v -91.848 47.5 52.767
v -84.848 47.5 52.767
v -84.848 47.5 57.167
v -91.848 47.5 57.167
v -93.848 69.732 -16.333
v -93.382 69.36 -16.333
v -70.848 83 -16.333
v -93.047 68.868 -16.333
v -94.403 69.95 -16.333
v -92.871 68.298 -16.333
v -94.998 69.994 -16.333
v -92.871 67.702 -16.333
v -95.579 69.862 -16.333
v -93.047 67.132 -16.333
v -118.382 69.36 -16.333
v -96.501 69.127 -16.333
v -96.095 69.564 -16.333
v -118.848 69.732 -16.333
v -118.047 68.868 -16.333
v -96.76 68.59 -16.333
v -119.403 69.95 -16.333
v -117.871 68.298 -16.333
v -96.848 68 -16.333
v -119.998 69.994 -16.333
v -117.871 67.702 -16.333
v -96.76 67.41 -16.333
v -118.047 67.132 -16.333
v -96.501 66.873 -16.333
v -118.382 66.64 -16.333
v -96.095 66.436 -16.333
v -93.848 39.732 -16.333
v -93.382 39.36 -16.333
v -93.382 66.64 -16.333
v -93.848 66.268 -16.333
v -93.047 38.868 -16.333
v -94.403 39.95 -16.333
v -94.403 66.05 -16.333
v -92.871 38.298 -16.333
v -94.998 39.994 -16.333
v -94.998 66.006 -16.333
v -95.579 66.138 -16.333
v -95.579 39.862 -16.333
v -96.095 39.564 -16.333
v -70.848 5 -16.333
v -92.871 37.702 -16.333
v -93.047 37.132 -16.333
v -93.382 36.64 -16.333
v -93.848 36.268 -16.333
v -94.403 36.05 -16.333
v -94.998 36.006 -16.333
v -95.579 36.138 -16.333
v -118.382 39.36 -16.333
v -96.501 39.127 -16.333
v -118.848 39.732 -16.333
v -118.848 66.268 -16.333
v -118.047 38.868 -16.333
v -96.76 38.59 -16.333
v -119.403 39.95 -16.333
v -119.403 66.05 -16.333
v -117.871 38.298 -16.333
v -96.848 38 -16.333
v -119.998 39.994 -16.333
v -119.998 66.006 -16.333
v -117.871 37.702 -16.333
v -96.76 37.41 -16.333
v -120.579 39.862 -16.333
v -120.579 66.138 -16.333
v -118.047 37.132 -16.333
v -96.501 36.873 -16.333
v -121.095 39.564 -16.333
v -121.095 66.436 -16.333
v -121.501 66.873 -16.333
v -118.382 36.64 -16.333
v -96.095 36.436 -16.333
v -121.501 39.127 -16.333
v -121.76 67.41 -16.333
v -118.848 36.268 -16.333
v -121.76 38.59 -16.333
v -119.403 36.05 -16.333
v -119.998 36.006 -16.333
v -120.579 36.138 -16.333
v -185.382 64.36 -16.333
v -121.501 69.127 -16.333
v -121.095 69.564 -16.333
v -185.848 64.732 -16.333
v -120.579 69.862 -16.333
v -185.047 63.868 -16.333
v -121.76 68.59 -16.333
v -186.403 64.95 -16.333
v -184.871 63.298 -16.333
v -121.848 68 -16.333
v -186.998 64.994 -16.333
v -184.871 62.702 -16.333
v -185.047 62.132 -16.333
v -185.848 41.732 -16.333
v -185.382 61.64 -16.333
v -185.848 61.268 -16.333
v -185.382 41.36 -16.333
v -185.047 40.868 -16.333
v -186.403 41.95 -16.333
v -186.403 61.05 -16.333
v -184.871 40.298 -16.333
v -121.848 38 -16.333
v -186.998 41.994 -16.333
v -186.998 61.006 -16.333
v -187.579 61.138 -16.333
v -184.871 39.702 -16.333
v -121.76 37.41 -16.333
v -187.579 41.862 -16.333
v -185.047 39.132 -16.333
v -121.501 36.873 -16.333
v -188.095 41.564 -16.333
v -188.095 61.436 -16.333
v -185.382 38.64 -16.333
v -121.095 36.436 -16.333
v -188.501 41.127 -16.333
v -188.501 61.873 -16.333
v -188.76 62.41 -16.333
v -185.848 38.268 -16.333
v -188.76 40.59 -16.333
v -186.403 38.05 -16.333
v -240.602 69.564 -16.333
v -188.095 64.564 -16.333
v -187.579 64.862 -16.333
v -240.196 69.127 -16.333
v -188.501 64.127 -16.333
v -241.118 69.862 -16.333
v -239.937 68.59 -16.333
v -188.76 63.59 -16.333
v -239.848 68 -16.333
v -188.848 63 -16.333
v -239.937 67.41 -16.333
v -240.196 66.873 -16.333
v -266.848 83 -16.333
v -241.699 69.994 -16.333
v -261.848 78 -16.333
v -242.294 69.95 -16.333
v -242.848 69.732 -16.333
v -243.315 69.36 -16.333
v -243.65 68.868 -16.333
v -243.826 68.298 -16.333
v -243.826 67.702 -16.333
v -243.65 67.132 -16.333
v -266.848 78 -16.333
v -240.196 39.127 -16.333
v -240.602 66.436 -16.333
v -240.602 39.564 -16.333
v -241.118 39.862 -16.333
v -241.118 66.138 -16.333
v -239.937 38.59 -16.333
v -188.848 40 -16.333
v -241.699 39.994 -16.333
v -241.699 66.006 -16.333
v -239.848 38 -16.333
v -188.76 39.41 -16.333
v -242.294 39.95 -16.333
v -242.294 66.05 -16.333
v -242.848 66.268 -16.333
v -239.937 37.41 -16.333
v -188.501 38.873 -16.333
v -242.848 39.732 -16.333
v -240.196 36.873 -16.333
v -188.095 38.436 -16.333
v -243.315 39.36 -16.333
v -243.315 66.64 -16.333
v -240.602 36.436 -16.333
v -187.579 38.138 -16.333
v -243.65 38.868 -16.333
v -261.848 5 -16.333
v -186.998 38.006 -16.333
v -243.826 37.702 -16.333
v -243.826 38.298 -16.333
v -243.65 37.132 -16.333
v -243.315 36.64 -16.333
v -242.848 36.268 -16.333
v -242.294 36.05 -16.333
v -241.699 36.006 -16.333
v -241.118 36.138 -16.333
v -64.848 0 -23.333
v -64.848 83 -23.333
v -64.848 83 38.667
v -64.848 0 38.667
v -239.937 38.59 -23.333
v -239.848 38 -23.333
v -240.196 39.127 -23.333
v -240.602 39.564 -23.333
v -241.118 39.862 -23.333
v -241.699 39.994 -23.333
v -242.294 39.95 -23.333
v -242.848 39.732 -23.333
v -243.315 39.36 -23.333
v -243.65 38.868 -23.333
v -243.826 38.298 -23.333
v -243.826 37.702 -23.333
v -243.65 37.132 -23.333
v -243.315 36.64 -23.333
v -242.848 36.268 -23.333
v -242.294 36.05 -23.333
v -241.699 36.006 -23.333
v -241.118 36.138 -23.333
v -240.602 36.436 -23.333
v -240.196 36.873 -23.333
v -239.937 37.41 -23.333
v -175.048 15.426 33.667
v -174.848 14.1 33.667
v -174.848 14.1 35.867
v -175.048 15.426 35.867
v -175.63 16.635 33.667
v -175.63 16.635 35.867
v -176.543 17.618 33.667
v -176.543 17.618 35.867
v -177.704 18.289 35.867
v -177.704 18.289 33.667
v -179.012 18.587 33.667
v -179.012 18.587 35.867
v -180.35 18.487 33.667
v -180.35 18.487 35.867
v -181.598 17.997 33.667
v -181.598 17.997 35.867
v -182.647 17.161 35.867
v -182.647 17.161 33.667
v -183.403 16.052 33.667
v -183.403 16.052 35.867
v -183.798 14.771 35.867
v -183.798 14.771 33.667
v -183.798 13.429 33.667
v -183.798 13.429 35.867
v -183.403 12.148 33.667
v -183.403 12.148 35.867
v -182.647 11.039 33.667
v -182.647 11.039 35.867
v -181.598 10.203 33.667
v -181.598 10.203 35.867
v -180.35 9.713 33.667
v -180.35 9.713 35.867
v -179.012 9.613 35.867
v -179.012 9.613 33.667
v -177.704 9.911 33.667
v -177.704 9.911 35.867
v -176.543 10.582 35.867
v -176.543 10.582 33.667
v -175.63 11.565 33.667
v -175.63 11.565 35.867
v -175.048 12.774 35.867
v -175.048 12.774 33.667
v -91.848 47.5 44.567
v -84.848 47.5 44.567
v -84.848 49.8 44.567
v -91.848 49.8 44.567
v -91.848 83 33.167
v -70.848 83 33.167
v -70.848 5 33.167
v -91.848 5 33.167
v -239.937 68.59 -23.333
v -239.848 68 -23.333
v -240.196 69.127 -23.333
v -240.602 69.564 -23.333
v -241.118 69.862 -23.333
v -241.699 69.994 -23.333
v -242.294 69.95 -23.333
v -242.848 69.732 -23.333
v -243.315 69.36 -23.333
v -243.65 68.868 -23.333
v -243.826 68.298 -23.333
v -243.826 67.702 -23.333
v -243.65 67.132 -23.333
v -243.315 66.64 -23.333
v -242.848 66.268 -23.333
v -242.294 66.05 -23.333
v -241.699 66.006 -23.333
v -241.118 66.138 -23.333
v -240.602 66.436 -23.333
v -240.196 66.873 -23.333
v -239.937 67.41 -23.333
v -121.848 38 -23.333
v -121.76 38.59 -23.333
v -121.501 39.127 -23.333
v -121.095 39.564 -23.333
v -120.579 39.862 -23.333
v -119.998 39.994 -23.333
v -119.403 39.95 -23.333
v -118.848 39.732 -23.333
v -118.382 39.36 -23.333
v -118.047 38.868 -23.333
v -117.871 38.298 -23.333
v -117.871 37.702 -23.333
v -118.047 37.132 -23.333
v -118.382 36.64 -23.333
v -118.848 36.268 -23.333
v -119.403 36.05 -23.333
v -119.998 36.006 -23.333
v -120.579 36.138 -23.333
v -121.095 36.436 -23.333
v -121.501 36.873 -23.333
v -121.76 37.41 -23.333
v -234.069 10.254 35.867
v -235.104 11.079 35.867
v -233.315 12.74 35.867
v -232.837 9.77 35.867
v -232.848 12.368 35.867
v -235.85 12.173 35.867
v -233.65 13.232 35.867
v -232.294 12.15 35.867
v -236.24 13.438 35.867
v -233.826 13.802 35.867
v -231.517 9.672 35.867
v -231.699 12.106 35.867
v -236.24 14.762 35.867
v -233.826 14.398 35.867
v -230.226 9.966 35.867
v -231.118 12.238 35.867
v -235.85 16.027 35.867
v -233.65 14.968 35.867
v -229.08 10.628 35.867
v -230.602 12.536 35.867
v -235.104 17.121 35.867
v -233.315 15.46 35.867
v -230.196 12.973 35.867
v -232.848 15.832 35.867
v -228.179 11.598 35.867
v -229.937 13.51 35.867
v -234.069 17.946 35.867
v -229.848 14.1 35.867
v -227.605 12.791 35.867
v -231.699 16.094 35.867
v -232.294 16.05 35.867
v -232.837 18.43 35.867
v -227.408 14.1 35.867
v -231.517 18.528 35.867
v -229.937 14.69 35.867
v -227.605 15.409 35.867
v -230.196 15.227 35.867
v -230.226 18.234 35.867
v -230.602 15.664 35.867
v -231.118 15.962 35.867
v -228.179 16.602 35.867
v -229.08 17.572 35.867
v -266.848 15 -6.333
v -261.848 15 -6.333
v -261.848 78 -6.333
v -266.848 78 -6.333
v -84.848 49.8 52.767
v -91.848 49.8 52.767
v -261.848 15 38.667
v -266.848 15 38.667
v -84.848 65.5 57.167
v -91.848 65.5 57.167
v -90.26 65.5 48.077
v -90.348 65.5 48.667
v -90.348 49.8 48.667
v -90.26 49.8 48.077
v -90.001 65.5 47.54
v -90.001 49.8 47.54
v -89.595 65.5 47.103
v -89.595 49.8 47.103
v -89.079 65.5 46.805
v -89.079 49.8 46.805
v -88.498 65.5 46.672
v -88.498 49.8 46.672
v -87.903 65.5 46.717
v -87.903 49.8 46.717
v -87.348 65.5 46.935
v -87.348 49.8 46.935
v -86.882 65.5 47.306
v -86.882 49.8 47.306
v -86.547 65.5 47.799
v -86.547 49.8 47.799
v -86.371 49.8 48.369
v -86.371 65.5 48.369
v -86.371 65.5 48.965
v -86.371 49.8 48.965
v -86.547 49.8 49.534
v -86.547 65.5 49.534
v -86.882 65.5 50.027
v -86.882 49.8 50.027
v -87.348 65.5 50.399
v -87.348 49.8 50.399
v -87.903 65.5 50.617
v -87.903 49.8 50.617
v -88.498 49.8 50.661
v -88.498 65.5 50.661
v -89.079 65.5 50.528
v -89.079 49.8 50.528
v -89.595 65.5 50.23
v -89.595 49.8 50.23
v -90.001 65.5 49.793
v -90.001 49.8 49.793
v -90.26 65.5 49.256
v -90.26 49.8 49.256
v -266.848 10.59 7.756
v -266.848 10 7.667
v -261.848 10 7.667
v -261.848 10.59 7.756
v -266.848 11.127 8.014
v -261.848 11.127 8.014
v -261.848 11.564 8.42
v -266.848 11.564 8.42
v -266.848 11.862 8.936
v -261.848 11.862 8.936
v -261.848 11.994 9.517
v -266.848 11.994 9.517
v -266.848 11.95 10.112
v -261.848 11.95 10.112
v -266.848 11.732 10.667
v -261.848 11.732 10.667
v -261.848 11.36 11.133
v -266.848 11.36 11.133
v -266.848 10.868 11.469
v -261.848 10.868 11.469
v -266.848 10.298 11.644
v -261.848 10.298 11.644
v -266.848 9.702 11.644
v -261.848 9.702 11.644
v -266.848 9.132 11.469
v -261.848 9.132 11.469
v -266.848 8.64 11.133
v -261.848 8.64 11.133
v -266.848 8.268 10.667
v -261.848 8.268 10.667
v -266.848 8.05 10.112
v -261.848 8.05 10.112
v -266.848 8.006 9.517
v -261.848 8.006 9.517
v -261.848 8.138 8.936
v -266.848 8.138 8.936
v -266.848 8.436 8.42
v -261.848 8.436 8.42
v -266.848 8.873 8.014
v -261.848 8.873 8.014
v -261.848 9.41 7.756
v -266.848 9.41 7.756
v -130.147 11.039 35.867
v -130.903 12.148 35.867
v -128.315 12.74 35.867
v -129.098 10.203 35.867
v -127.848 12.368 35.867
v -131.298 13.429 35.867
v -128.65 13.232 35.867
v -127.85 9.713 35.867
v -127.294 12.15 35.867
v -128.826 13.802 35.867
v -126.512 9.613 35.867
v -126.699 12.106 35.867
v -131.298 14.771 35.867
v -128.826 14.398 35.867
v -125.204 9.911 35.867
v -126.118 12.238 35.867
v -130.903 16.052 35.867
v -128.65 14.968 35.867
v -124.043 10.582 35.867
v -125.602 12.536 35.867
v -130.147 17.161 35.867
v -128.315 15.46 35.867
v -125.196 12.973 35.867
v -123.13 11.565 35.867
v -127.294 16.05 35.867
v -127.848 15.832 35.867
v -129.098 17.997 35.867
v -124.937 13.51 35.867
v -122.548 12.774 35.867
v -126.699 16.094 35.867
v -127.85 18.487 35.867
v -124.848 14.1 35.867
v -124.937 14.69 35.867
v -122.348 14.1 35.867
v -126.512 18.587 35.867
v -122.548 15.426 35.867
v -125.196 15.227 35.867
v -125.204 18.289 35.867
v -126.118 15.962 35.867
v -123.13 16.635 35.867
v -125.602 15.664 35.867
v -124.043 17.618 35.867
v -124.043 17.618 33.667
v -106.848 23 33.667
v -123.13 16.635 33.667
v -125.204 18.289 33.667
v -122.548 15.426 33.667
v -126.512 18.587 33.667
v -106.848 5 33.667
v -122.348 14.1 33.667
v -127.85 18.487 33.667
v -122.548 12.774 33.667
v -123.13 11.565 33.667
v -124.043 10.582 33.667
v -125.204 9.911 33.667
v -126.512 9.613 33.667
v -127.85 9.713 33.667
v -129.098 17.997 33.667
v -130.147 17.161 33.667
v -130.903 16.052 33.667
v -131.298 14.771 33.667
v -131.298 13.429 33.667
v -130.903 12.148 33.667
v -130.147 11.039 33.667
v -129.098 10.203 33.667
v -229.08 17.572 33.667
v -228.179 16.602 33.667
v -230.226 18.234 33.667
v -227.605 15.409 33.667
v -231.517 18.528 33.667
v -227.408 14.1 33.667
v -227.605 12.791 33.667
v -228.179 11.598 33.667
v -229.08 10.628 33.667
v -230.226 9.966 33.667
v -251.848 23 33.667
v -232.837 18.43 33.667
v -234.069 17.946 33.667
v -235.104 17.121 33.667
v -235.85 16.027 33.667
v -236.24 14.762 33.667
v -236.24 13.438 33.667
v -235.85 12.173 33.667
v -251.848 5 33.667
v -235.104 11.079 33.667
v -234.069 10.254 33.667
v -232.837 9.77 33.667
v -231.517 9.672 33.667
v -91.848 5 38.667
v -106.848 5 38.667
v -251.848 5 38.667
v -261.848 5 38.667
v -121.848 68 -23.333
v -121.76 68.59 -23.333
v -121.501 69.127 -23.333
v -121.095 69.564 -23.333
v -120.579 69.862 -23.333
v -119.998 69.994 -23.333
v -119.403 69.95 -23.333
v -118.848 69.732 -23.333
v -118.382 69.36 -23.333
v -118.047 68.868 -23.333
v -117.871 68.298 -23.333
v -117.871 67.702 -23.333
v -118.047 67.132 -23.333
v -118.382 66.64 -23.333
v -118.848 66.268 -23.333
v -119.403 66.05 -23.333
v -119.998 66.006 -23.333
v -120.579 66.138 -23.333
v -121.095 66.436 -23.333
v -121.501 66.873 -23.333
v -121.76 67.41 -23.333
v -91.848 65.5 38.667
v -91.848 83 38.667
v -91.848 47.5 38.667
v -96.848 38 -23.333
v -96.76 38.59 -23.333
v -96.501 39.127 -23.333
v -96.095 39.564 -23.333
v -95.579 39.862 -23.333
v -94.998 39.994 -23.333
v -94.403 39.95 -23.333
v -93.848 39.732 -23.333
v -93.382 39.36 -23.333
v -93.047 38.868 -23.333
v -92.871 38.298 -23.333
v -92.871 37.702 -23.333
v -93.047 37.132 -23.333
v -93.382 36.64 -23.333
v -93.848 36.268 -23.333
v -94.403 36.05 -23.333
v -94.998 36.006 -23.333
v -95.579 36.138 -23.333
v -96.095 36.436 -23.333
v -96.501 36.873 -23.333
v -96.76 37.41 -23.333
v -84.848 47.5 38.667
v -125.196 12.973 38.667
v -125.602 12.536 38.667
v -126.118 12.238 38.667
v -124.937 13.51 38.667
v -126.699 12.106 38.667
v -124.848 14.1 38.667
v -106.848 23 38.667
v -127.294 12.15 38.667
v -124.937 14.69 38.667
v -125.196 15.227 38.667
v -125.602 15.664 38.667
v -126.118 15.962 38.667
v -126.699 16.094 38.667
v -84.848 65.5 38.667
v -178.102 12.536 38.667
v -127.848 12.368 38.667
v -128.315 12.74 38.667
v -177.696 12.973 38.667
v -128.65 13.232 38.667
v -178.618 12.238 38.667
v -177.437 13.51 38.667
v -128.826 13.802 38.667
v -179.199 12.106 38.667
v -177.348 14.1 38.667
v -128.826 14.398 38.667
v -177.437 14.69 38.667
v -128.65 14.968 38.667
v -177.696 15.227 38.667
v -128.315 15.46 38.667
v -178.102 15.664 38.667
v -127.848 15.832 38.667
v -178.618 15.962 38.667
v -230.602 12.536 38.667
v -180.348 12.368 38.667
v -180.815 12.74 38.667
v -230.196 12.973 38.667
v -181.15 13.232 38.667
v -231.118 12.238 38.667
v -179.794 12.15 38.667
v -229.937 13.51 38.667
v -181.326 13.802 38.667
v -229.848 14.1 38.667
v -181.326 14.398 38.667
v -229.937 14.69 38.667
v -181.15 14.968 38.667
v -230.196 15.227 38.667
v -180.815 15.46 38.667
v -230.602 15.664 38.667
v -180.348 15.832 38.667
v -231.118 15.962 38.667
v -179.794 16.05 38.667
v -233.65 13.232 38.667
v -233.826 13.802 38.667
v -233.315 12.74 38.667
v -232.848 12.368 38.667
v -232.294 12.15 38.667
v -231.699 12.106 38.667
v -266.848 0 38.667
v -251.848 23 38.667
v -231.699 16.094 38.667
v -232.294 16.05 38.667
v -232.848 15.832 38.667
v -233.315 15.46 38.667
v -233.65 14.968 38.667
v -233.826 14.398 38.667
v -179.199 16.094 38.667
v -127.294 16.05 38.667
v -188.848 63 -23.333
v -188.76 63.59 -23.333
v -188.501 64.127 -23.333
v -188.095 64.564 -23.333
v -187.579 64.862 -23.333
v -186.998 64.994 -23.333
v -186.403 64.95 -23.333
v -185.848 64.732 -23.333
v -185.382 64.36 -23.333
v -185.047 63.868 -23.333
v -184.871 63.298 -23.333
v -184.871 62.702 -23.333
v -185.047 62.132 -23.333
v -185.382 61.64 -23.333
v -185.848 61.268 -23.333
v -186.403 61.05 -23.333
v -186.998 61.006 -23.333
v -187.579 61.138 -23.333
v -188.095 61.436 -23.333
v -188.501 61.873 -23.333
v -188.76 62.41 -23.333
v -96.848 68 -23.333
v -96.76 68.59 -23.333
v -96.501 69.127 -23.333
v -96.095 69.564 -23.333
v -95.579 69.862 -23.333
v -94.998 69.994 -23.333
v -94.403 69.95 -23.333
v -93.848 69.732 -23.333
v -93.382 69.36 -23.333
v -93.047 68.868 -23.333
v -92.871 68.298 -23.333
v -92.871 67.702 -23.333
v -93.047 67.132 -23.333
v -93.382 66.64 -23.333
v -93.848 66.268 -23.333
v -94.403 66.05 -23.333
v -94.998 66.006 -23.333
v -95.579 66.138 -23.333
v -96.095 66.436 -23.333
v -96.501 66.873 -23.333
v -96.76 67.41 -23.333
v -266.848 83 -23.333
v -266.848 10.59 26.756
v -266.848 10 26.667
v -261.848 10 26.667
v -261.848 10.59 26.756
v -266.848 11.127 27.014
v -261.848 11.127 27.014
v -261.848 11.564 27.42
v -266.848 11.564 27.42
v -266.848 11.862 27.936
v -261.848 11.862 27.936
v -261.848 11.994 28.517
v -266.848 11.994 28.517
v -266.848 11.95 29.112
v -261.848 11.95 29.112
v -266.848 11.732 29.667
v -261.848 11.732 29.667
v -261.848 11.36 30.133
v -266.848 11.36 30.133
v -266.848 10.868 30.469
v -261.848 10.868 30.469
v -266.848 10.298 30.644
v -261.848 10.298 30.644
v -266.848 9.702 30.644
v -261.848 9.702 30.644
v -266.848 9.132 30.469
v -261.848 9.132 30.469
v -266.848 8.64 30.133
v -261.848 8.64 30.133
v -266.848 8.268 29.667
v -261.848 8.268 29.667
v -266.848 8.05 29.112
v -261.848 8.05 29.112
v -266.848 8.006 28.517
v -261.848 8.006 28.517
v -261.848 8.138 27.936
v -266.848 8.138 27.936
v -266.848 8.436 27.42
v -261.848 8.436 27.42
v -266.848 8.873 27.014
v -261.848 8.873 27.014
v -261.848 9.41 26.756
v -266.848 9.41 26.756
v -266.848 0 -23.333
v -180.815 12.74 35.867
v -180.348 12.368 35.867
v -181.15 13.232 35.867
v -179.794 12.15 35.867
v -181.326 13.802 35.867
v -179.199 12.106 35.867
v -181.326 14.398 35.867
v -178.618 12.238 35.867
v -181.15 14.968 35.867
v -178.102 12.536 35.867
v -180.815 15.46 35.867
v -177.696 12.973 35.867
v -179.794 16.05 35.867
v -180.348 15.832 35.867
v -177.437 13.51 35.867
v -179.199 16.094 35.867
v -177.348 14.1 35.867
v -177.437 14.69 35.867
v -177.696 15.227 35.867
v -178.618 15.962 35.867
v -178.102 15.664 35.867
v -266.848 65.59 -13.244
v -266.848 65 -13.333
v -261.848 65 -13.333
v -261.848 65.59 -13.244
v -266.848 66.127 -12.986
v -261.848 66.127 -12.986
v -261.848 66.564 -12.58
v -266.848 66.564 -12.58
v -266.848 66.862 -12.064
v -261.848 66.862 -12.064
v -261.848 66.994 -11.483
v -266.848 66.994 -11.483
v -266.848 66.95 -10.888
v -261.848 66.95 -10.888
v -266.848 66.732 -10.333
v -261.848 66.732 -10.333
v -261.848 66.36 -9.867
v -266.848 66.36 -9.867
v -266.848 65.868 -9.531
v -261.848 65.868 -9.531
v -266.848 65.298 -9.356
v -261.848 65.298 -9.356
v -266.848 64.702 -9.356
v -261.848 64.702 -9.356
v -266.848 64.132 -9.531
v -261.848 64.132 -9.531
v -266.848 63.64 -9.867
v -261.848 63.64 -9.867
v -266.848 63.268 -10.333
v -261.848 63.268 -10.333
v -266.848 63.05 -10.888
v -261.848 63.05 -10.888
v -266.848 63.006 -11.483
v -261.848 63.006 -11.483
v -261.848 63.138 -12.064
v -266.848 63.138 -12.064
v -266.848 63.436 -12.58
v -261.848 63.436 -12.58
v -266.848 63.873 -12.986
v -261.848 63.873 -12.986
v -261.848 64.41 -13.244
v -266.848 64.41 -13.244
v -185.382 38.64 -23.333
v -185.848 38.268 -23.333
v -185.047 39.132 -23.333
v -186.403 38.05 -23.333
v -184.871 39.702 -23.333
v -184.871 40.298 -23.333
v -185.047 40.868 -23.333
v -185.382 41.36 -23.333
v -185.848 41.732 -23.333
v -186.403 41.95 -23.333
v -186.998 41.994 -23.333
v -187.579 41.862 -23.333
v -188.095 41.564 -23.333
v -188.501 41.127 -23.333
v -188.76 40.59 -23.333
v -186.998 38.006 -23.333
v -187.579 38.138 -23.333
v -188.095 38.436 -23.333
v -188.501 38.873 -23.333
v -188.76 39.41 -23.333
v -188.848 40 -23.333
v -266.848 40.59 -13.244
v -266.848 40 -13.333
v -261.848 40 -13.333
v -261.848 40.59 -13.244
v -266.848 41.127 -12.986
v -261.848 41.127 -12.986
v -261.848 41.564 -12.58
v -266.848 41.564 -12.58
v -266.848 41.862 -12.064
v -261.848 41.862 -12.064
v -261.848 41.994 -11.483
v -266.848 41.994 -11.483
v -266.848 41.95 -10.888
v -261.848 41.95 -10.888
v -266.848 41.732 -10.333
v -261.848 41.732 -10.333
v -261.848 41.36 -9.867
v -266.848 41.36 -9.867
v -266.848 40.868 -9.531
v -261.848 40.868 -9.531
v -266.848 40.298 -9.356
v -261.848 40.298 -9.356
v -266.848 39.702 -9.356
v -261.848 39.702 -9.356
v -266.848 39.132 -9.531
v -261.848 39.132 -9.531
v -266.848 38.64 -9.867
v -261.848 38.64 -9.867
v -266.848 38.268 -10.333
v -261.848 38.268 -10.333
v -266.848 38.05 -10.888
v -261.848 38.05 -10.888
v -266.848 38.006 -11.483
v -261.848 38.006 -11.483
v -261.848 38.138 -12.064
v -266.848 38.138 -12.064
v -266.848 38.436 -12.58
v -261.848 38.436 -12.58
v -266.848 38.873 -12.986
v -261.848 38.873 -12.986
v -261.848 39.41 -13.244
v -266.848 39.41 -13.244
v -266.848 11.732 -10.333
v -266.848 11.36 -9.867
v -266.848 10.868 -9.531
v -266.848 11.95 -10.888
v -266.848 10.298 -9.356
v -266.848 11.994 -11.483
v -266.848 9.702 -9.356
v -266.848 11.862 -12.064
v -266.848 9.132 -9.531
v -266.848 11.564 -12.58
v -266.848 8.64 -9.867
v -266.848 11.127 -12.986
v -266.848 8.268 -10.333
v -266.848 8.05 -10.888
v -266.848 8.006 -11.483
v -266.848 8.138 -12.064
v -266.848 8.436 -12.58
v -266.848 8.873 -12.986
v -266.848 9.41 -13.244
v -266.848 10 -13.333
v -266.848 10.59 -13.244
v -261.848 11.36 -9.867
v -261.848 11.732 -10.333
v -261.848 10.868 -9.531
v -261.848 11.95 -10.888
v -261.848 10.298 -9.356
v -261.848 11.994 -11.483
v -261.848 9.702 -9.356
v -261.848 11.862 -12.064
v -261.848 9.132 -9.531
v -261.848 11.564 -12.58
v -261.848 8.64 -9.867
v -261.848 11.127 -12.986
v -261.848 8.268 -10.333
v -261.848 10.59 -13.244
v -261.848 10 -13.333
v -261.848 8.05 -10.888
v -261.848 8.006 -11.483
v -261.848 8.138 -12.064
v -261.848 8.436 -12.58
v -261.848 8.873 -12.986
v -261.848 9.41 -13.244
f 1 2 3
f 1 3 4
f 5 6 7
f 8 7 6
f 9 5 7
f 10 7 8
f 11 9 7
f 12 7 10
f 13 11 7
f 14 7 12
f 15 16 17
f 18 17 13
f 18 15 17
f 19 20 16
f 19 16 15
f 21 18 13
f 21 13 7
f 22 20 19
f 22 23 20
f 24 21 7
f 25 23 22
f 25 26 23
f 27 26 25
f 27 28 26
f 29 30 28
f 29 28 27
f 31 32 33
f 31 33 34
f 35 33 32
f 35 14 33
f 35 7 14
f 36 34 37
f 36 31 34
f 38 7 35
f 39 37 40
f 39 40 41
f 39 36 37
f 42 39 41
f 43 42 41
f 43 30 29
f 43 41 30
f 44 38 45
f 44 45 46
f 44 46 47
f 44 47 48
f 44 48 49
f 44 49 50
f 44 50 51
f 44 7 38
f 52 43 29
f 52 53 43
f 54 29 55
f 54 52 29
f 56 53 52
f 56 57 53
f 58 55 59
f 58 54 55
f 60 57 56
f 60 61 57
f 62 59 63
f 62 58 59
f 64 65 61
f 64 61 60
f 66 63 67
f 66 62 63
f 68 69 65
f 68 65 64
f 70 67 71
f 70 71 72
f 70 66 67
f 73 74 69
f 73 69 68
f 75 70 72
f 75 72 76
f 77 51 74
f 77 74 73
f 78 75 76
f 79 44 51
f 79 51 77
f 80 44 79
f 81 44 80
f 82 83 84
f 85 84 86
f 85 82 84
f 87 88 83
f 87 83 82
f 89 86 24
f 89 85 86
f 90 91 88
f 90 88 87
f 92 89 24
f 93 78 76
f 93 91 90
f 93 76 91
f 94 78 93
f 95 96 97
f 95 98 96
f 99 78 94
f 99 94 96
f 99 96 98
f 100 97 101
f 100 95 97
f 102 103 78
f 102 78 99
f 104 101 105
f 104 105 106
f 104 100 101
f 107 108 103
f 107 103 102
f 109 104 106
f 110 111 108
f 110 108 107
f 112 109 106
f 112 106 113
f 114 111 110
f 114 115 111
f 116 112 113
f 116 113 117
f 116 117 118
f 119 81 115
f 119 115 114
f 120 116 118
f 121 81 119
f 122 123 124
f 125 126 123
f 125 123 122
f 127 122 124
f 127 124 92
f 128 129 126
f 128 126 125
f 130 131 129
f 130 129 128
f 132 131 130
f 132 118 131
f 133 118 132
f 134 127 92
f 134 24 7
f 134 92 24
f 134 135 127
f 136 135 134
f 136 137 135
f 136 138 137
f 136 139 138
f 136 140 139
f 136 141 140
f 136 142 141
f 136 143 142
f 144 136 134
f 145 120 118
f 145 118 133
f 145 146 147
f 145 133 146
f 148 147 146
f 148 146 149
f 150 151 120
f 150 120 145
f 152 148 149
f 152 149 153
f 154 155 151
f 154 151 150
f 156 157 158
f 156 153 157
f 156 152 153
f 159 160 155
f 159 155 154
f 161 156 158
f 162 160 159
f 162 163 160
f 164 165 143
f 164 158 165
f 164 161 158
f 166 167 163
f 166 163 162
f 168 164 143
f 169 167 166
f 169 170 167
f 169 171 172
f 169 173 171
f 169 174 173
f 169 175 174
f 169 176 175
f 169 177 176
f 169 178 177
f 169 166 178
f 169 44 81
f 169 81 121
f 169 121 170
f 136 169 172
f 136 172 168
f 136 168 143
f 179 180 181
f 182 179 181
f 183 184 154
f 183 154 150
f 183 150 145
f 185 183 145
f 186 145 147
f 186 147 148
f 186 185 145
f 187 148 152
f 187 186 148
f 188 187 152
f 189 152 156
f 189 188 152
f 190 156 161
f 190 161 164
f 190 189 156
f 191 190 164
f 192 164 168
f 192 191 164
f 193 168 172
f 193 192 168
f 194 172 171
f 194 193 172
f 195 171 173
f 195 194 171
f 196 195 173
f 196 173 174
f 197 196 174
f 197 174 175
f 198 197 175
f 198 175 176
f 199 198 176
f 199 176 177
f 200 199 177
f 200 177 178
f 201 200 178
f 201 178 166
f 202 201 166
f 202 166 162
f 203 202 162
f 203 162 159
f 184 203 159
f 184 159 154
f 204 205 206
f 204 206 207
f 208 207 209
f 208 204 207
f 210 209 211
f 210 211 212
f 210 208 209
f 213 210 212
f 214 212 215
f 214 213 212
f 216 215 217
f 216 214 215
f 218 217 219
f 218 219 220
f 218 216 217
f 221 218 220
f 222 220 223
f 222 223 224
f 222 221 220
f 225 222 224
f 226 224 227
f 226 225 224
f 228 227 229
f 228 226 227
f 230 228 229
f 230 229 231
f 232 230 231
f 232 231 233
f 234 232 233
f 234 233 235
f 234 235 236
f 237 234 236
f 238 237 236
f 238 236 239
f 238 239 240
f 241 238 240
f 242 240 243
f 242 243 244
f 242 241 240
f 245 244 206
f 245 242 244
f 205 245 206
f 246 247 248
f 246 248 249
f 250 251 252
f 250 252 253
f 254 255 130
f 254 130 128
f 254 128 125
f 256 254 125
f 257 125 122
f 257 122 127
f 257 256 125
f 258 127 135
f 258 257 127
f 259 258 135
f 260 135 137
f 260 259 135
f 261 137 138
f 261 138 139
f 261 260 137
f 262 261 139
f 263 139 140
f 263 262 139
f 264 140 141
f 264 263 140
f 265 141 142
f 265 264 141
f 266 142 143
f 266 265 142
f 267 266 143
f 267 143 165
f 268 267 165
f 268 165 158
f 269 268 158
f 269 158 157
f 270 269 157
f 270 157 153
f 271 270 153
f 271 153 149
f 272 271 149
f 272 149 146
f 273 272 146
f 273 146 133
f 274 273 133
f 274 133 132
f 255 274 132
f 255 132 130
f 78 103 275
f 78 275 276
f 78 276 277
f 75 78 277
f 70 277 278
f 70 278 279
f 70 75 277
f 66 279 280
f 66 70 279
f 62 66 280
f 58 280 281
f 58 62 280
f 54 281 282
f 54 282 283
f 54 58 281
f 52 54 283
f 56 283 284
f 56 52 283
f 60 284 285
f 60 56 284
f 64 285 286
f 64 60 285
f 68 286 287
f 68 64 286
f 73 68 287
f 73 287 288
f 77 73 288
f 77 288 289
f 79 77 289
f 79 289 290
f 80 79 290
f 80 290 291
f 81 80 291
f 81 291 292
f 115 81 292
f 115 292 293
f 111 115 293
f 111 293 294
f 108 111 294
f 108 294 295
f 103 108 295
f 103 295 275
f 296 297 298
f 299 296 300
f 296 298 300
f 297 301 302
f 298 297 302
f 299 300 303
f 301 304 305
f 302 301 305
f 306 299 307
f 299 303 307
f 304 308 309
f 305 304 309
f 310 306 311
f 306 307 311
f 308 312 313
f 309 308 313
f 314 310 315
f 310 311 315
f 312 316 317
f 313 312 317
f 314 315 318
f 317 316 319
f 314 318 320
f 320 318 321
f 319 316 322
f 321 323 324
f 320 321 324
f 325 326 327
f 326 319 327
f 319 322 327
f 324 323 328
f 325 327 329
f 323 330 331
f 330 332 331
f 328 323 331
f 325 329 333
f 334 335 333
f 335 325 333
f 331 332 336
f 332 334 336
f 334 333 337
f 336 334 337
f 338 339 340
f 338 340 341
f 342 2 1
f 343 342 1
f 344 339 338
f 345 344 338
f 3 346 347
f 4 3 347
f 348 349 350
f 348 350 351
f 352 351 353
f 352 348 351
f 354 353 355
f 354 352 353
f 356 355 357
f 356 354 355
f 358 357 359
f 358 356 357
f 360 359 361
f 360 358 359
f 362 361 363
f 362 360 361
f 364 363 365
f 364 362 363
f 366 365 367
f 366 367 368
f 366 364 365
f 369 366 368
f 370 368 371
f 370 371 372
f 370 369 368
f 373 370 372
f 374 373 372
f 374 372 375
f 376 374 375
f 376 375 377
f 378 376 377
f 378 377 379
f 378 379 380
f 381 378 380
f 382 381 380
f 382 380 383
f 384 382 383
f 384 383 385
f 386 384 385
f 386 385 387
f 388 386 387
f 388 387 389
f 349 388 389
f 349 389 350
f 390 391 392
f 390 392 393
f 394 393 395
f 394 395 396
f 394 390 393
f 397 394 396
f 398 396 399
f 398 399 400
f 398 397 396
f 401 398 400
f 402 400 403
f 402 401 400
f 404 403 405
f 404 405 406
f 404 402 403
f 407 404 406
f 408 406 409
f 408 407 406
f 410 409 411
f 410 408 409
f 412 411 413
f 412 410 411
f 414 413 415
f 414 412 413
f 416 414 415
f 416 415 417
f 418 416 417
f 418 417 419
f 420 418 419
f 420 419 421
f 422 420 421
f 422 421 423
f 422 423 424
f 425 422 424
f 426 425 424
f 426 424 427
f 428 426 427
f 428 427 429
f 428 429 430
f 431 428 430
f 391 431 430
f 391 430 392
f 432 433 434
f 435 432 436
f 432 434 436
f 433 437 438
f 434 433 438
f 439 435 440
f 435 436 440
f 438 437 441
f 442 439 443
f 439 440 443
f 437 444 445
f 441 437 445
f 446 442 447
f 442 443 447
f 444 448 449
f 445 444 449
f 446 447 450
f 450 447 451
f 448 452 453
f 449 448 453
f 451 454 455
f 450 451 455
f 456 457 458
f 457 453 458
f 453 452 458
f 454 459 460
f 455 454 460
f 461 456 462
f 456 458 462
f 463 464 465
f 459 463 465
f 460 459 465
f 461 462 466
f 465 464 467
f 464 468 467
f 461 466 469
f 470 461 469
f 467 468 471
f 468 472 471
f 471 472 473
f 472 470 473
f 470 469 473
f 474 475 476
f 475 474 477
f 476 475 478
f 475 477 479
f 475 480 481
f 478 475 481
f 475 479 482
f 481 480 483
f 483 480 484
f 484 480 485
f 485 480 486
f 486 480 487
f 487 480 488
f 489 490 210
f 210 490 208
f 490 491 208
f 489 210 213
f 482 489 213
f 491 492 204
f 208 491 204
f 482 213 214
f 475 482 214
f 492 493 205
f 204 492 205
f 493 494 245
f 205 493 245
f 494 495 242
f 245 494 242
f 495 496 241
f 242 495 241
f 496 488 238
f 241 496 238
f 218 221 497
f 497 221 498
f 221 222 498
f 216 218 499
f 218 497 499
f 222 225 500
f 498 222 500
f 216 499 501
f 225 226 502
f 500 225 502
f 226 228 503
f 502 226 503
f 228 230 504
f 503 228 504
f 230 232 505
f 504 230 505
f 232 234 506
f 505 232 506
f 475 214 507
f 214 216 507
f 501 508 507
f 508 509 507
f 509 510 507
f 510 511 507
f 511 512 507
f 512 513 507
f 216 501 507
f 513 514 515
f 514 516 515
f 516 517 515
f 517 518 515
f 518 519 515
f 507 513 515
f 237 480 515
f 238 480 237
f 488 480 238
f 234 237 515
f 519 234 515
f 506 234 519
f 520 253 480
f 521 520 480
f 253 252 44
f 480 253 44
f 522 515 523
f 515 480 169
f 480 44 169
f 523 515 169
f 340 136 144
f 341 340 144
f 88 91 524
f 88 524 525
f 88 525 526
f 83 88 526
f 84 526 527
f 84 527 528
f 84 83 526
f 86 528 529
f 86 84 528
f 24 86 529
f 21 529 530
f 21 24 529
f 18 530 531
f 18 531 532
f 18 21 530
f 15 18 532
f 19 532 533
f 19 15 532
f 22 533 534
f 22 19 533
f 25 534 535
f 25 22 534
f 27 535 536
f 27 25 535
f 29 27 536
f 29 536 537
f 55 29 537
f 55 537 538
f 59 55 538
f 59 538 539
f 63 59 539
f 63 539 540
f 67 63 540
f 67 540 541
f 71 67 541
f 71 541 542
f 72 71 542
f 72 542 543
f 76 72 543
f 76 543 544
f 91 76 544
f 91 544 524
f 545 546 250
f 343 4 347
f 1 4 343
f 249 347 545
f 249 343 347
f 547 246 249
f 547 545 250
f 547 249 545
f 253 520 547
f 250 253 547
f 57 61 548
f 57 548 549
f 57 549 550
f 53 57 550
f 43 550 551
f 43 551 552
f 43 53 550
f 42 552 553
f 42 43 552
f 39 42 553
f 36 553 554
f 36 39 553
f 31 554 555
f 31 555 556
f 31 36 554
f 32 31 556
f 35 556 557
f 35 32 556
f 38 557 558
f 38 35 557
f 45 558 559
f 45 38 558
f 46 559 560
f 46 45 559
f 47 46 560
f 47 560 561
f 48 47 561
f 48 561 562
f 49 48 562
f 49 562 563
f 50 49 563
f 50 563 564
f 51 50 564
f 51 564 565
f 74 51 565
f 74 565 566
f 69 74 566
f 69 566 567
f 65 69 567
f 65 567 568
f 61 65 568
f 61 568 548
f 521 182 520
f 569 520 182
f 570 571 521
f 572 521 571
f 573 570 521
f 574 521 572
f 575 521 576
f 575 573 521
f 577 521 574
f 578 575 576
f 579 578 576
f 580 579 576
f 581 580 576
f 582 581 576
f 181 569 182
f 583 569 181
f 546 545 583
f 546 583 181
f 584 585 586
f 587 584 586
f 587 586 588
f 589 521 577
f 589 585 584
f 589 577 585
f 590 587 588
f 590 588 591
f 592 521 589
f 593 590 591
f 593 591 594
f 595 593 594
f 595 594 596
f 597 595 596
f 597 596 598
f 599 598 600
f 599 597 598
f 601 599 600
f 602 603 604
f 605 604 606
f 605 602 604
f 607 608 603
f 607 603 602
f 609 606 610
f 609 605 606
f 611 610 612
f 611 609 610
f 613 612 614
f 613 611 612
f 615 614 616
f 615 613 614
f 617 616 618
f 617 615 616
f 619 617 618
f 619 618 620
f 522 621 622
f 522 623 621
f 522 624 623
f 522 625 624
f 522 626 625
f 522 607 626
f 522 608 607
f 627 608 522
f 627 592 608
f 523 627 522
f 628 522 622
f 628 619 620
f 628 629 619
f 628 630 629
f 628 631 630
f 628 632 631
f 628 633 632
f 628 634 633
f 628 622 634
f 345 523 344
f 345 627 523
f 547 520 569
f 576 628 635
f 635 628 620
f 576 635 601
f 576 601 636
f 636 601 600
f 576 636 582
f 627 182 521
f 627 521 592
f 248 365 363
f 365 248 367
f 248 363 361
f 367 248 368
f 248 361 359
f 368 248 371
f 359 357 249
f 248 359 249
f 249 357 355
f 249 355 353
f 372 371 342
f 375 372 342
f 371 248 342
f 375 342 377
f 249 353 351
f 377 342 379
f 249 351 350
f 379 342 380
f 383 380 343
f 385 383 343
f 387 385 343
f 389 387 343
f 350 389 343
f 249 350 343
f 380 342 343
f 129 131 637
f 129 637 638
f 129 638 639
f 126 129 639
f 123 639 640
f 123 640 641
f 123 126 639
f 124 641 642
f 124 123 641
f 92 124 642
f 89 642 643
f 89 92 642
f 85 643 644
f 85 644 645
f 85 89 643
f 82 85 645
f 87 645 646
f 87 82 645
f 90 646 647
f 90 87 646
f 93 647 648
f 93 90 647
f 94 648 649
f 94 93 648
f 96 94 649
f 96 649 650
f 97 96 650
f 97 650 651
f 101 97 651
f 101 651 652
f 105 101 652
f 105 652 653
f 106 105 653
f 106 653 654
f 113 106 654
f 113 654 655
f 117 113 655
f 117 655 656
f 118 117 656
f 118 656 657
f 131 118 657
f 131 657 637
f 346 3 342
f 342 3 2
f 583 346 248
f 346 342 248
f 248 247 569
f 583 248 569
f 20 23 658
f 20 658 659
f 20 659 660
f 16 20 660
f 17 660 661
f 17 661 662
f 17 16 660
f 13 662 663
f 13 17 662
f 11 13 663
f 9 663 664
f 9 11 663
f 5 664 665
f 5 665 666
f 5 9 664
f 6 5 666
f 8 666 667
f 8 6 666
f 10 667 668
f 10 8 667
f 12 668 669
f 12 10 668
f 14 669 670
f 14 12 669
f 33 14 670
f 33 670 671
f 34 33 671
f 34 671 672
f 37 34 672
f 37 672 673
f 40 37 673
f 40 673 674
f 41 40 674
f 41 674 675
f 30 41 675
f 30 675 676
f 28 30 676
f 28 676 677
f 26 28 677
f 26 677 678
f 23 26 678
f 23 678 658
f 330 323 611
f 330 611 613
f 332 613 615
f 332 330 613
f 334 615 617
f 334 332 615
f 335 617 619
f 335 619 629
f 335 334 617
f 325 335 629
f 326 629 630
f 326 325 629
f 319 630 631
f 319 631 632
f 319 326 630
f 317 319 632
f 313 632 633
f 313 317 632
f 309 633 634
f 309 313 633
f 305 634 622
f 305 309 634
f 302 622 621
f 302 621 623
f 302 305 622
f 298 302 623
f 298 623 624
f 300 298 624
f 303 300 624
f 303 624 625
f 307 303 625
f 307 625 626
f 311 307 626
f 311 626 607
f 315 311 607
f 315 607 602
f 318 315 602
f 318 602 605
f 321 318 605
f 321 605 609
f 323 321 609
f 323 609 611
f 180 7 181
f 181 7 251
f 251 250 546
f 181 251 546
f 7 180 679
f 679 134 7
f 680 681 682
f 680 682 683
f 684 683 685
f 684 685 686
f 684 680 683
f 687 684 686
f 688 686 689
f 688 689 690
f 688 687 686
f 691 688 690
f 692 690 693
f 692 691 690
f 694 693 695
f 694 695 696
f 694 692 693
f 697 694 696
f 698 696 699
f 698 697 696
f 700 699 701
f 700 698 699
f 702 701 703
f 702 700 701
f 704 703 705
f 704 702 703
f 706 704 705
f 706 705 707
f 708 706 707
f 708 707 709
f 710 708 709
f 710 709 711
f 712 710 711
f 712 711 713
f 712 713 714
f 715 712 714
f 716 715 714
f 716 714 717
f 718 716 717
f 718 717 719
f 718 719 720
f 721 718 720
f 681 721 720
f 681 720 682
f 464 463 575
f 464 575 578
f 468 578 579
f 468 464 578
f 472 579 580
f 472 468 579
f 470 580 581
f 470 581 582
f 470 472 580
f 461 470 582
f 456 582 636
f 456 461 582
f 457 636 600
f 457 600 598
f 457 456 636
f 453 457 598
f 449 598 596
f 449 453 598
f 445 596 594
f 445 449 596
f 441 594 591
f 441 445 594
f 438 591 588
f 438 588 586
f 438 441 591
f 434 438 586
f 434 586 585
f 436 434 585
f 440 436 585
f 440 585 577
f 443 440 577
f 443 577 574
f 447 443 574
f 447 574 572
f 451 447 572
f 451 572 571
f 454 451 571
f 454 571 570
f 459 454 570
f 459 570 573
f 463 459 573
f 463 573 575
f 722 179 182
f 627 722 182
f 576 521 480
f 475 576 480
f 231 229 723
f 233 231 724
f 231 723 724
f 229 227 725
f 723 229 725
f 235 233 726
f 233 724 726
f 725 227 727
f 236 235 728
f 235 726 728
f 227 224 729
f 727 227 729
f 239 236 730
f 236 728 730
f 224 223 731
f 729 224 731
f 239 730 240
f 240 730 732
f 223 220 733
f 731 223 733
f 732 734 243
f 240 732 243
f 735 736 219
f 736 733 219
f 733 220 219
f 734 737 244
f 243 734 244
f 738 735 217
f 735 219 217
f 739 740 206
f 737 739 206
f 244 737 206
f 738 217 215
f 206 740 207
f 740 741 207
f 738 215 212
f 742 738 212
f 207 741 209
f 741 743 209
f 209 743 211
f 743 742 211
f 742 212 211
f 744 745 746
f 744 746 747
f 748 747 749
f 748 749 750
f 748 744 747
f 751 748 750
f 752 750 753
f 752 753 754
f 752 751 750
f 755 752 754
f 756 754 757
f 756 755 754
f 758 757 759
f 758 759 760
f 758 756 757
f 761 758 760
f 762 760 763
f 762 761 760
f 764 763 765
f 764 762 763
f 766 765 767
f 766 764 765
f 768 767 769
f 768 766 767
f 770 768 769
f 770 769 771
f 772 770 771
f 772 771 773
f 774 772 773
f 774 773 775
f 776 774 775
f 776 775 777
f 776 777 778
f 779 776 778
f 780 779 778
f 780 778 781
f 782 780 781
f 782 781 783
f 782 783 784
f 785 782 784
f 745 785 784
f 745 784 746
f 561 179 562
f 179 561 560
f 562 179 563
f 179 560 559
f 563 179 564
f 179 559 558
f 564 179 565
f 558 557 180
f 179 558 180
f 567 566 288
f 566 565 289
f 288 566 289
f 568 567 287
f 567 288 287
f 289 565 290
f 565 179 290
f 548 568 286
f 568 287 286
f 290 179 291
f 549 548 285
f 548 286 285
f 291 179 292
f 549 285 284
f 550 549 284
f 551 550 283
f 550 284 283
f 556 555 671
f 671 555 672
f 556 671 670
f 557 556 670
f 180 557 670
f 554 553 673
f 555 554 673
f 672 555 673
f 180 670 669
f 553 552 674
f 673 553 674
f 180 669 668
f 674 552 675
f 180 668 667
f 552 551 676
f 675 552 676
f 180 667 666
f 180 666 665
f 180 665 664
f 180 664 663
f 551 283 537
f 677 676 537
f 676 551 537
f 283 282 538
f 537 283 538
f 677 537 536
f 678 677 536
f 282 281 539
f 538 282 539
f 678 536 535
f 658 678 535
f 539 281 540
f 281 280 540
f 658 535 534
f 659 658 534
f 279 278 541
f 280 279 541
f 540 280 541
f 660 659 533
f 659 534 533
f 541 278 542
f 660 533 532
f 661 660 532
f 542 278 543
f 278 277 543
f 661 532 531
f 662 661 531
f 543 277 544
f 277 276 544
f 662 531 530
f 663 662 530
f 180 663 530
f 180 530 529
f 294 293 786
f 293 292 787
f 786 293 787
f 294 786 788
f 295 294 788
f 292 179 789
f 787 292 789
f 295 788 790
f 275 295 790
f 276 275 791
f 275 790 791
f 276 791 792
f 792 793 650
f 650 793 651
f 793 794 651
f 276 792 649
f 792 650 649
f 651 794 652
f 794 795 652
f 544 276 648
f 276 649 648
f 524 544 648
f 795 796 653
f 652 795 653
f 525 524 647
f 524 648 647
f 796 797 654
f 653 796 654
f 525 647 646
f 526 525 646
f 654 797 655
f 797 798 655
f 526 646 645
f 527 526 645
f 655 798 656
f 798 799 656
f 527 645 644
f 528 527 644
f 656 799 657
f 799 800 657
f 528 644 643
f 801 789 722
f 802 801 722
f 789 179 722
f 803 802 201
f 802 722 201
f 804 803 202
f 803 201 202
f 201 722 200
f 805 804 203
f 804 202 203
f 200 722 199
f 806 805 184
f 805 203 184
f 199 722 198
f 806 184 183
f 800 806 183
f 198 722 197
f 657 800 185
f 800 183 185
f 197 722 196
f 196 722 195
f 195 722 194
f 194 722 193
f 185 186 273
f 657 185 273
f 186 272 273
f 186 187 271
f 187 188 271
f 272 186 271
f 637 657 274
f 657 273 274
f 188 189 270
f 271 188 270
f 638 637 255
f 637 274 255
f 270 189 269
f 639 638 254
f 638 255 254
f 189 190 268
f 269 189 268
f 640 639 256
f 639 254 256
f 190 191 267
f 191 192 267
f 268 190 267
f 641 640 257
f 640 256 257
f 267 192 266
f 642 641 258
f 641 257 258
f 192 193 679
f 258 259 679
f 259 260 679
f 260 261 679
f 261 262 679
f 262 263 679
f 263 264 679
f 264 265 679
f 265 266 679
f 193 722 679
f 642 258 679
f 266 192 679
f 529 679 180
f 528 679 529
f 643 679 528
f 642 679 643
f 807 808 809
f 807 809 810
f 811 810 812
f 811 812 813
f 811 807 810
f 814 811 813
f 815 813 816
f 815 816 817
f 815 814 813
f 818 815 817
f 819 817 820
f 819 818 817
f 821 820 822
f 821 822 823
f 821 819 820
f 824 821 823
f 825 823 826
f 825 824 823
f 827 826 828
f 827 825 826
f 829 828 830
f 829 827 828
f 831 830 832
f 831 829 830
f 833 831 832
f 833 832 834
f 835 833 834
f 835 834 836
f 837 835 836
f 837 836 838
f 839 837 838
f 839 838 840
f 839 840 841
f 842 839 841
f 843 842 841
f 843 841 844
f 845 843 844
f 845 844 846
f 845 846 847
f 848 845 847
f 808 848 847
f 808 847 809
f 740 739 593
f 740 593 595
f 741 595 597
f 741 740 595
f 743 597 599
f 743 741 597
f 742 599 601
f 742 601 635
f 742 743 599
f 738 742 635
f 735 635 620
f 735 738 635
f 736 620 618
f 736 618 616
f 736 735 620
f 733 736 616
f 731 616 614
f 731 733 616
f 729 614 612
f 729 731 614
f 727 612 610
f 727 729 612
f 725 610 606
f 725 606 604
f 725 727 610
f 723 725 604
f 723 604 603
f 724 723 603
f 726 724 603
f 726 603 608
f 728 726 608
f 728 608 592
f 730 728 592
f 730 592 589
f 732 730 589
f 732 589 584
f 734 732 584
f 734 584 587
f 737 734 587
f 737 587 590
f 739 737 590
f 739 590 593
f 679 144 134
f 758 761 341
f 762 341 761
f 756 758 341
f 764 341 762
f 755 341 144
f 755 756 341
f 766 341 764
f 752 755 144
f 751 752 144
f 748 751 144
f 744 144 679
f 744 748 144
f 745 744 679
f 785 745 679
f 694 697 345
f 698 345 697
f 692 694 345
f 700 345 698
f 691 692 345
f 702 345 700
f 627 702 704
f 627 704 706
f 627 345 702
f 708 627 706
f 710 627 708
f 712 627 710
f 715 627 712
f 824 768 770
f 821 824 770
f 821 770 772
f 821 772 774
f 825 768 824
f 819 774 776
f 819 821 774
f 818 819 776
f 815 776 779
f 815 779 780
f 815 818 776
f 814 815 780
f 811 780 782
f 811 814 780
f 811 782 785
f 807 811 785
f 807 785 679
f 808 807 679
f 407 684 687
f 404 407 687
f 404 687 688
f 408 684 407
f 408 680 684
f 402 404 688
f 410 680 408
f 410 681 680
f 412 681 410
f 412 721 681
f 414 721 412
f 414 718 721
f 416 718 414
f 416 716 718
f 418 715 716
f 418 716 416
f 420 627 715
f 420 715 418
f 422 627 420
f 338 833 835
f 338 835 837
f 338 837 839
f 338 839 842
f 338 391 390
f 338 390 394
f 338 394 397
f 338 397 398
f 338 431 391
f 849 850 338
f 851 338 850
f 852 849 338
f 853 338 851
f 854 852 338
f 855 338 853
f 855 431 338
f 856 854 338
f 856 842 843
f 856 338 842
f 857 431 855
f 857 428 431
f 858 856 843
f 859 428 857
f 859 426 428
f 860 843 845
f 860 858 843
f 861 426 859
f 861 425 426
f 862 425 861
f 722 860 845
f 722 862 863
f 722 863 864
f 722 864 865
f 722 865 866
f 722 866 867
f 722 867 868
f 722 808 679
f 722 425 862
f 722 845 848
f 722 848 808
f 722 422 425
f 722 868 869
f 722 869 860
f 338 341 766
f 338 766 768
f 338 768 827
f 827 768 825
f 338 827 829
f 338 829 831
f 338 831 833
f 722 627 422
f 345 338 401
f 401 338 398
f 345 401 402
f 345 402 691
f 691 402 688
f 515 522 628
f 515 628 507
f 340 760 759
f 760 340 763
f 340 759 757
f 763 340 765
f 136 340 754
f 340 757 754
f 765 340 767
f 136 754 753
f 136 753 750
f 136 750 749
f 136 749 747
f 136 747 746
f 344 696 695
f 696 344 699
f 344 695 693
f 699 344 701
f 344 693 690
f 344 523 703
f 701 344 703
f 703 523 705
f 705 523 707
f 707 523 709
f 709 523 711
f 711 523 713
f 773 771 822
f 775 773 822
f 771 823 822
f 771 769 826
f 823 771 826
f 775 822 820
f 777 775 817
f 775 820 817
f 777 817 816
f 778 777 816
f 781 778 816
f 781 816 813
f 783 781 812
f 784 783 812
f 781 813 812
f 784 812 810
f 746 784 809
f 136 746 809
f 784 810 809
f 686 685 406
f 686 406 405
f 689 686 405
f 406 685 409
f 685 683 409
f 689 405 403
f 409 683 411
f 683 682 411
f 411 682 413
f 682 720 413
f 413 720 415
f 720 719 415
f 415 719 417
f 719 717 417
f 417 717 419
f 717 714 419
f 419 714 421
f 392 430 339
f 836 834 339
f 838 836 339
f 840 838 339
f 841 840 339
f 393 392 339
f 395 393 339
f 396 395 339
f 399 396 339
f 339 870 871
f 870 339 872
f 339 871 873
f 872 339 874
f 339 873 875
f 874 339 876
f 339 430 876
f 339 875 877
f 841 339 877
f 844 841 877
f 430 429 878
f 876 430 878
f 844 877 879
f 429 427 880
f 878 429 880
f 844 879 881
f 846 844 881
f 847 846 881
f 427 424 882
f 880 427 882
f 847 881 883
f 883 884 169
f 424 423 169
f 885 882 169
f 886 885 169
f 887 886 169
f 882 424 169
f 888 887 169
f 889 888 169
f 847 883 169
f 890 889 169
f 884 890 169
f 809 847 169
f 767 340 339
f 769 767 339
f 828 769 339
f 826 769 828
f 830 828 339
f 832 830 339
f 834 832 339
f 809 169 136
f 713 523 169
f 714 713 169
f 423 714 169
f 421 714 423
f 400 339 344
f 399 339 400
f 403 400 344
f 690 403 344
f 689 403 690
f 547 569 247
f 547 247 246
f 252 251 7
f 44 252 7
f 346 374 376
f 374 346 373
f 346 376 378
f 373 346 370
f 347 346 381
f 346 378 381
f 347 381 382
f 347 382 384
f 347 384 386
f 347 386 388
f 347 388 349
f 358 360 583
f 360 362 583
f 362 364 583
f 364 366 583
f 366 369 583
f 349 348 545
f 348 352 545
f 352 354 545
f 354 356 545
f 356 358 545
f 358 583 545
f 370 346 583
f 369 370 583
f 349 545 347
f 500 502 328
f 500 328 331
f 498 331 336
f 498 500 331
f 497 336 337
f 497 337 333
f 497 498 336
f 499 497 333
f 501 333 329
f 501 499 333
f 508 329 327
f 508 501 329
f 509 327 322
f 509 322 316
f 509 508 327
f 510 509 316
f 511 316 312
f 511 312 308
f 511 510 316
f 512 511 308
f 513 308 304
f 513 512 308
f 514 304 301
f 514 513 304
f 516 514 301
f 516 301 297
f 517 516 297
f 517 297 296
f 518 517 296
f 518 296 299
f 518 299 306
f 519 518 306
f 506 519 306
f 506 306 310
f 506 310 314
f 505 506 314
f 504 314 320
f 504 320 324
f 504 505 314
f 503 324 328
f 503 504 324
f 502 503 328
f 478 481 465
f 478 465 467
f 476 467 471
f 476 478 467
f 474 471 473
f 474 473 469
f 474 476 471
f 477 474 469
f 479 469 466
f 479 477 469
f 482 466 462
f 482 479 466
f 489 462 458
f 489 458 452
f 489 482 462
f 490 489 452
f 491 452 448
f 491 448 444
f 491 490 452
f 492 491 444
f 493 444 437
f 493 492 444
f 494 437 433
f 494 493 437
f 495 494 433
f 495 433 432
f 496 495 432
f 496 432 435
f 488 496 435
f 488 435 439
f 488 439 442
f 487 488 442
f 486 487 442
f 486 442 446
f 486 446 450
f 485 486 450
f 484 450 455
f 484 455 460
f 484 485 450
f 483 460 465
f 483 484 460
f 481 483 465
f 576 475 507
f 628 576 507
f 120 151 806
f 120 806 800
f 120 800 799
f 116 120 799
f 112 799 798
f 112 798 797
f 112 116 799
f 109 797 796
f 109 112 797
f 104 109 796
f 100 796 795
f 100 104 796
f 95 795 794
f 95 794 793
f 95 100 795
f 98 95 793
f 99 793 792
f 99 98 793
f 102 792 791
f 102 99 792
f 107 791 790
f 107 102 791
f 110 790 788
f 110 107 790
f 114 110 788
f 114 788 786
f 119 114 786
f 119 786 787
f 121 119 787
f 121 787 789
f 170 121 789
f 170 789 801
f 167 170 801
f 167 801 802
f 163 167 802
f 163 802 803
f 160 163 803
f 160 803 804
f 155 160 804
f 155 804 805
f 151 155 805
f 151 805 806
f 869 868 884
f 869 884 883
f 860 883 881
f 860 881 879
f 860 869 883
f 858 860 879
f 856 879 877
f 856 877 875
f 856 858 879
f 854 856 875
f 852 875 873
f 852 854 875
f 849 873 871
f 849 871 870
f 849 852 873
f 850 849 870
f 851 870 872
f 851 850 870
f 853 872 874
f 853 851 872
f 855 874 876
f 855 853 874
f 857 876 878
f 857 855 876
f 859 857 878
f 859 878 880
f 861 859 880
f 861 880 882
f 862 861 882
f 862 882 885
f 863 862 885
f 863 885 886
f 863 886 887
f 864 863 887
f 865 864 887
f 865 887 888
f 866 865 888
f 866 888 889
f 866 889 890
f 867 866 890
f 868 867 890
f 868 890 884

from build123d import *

# Parameters (mm, degrees)
SKETCH1_W           = 182
SKETCH1_H           = 62
BOSS_EXTRUDE1_DEPTH = 5
SKETCH2_W           = 145
SKETCH2_H           = 5
BOSS_EXTRUDE2_DEPTH = 18
SKETCH3_R           = 2
CUT_EXTRUDE1_DEPTH  = 18
SKETCH4_W           = 7
SKETCH4_H           = 62
BOSS_EXTRUDE3_DEPTH = 78
SKETCH5_W           = 175
SKETCH5_H           = 7
BOSS_EXTRUDE4_DEPTH = 78
SKETCH6_W           = 7
SKETCH6_H           = 18
BOSS_EXTRUDE5_DEPTH = 18.5
SKETCH7_R           = 2
CUT_EXTRUDE2_DEPTH  = 18
SKETCH8_W           = 7
SKETCH8_H           = 8.2
CUT_EXTRUDE3_DEPTH  = 2.3
SKETCH9_R           = 4.440846437
SKETCH9_R_2         = 4.5
CUT_EXTRUDE4_DEPTH  = 2.2
SKETCH12_W          = 5
SKETCH12_H          = 55
BOSS_EXTRUDE6_DEPTH = 10
SKETCH13_W          = 5
SKETCH13_H          = 10
BOSS_EXTRUDE7_DEPTH = 63
SKETCH15_R          = 2
CUT_EXTRUDE6_DEPTH  = 63
SKETCH16_W          = 62
SKETCH16_H          = 83
BOSS_EXTRUDE8_DEPTH = 20
SKETCH17_W          = 21
SKETCH17_H          = 49.5
CUT_EXTRUDE7_DEPTH  = 78
SKETCH18_R          = 2
CUT_EXTRUDE8_DEPTH  = 82
SKETCH19_R          = 2
CUT_EXTRUDE9_DEPTH  = 82
SKETCH21_R          = 2
CUT_EXTRUDE10_DEPTH = 10


with BuildPart() as part:
    # Sketch1 → Boss-Extrude1 (new body)
    with BuildSketch(Plane(origin=(0, 0, 0), x_dir=(1, 0, 0), z_dir=(0, 1, 0))):
        with Locations((46.151515152, -7.666666667)):
            Rectangle(SKETCH1_W, SKETCH1_H)
    extrude(amount=BOSS_EXTRUDE1_DEPTH)

    # Sketch2 → Boss-Extrude2 (add)
    with BuildSketch(Plane(origin=(0, 5, 0), x_dir=(1, 0, 0), z_dir=(0, 1, 0))):
        with Locations((49.651515152, -36.166666667)):
            Rectangle(SKETCH2_W, SKETCH2_H)
    extrude(amount=BOSS_EXTRUDE2_DEPTH)

    # Sketch3 → Cut-Extrude1 (cut)
    with BuildSketch(Plane(origin=(0, 0, 33.666666667), x_dir=(-1, 0, 0), z_dir=(0, 0, -1))):
        with Locations((-102.151515152, 14.1)):
            Circle(SKETCH3_R)
        with Locations((-49.651515152, 14.1)):
            Circle(SKETCH3_R)
        with Locations((2.848484848, 14.1)):
            Circle(SKETCH3_R)
    extrude(amount=-CUT_EXTRUDE1_DEPTH, mode=Mode.SUBTRACT)

    # Sketch4 → Boss-Extrude3 (add)
    with BuildSketch(Plane(origin=(0, 5, 0), x_dir=(1, 0, 0), z_dir=(0, 1, 0))):
        with Locations((-41.348484848, -7.666666667)):
            Rectangle(SKETCH4_W, SKETCH4_H)
    extrude(amount=BOSS_EXTRUDE3_DEPTH)

    # Sketch5 → Boss-Extrude4 (add)
    with BuildSketch(Plane(origin=(0, 5, 0), x_dir=(1, 0, 0), z_dir=(0, 1, 0))):
        with Locations((49.651515152, 19.833333333)):
            Rectangle(SKETCH5_W, SKETCH5_H)
    extrude(amount=BOSS_EXTRUDE4_DEPTH)

    # Sketch6 → Boss-Extrude5 (add)
    with BuildSketch(Plane.XY.offset(38.666666667)):
        with Locations((-41.348484848, 56.5)):
            Rectangle(SKETCH6_W, SKETCH6_H)
    extrude(amount=BOSS_EXTRUDE5_DEPTH)

    # Sketch7 → Cut-Extrude2 (cut)
    with BuildSketch(Plane(origin=(0, 65.5, 0), x_dir=(1, 0, 0), z_dir=(0, 1, 0))):
        with Locations((-41.348484848, -48.666666667)):
            Circle(SKETCH7_R)
    extrude(amount=-CUT_EXTRUDE2_DEPTH, mode=Mode.SUBTRACT)

    # Sketch8 → Cut-Extrude3 (cut)
    with BuildSketch(Plane.XZ.offset(-47.5)):
        with Locations((-41.348484848, 48.666666667)):
            Rectangle(SKETCH8_W, SKETCH8_H)
    extrude(amount=-CUT_EXTRUDE3_DEPTH, mode=Mode.SUBTRACT)

    # Sketch9 → Cut-Extrude4 (cut)
    with BuildSketch(Plane(origin=(0, 0, 33.666666667), x_dir=(-1, 0, 0), z_dir=(0, 0, -1))):
        with Locations((-102.151515152, 14.1)):
            Circle(SKETCH9_R)
        with Locations((-49.651515152, 14.1)):
            Circle(SKETCH9_R_2)
        with Locations((2.848484848, 14.1)):
            Circle(SKETCH9_R_2)
    extrude(amount=-CUT_EXTRUDE4_DEPTH, mode=Mode.SUBTRACT)

    # Sketch12 → Boss-Extrude6 (add)
    with BuildSketch(Plane(origin=(0, 5, 0), x_dir=(1, 0, 0), z_dir=(0, 1, 0))):
        with Locations((134.651515152, -11.166666667)):
            Rectangle(SKETCH12_W, SKETCH12_H)
    extrude(amount=BOSS_EXTRUDE6_DEPTH)

    # Sketch13 → Boss-Extrude7 (add)
    with BuildSketch(Plane(origin=(0, 15, 0), x_dir=(1, 0, 0), z_dir=(0, 1, 0))):
        with Locations((134.651515152, 11.333333333)):
            Rectangle(SKETCH13_W, SKETCH13_H)
    extrude(amount=BOSS_EXTRUDE7_DEPTH)

    # Sketch15 → Cut-Extrude6 (cut)
    with BuildSketch(Plane(origin=(137.151515152, 0, 0), x_dir=(0, 0, -1), z_dir=(1, 0, 0))):
        with Locations((11.333333333, 65)):
            Circle(SKETCH15_R)
        with Locations((11.333333333, 40)):
            Circle(SKETCH15_R)
        with Locations((11.333333333, 10)):
            Circle(SKETCH15_R)
        with Locations((-28.666666667, 10)):
            Circle(SKETCH15_R)
        with Locations((-9.666666667, 10)):
            Circle(SKETCH15_R)
    extrude(amount=-CUT_EXTRUDE6_DEPTH, mode=Mode.SUBTRACT)

    # Sketch16 → Boss-Extrude8 (add)
    with BuildSketch(Plane.ZY.offset(44.848484848)):
        with Locations((7.666666667, 41.5)):
            Rectangle(SKETCH16_W, SKETCH16_H)
    extrude(amount=BOSS_EXTRUDE8_DEPTH)

    # Sketch17 → Cut-Extrude7 (cut)
    with BuildSketch(Plane(origin=(0, 83, 0), x_dir=(1, 0, 0), z_dir=(0, 1, 0))):
        with Locations((-48.348484848, -8.416666667)):
            Rectangle(SKETCH17_W, SKETCH17_H)
    extrude(amount=-CUT_EXTRUDE7_DEPTH, mode=Mode.SUBTRACT)

    # Sketch18 → Cut-Extrude8 (cut)
    with BuildSketch(Plane.XY.offset(-16.333333333)):
        with Locations((-34.848484848, 68)):
            Circle(SKETCH18_R)
        with Locations((-9.848484848, 68)):
            Circle(SKETCH18_R)
        with Locations((-34.848484848, 38)):
            Circle(SKETCH18_R)
        with Locations((-9.848484848, 38)):
            Circle(SKETCH18_R)
    extrude(amount=-CUT_EXTRUDE8_DEPTH, mode=Mode.SUBTRACT)

    # Sketch19 → Cut-Extrude9 (cut)
    with BuildSketch(Plane.XY.offset(-16.333333333)):
        with Locations((57.151515152, 63)):
            Circle(SKETCH19_R)
        with Locations((57.151515152, 40)):
            Circle(SKETCH19_R)
    extrude(amount=-CUT_EXTRUDE9_DEPTH, mode=Mode.SUBTRACT)

    # Sketch21 → Cut-Extrude10 (cut)
    with BuildSketch(Plane(origin=(0, 0, -23.333333333), x_dir=(-1, 0, 0), z_dir=(0, 0, -1))):
        with Locations((-112.151515152, 38)):
            Circle(SKETCH21_R)
        with Locations((-112.151515152, 68)):
            Circle(SKETCH21_R)
    extrude(amount=-CUT_EXTRUDE10_DEPTH, mode=Mode.SUBTRACT)


with BuildPart() as body_2:
    # Mirror1: mirrored copy
    add(part.part.mirror(Plane.ZY.offset(64.848484848)))


solid = body_2.part
